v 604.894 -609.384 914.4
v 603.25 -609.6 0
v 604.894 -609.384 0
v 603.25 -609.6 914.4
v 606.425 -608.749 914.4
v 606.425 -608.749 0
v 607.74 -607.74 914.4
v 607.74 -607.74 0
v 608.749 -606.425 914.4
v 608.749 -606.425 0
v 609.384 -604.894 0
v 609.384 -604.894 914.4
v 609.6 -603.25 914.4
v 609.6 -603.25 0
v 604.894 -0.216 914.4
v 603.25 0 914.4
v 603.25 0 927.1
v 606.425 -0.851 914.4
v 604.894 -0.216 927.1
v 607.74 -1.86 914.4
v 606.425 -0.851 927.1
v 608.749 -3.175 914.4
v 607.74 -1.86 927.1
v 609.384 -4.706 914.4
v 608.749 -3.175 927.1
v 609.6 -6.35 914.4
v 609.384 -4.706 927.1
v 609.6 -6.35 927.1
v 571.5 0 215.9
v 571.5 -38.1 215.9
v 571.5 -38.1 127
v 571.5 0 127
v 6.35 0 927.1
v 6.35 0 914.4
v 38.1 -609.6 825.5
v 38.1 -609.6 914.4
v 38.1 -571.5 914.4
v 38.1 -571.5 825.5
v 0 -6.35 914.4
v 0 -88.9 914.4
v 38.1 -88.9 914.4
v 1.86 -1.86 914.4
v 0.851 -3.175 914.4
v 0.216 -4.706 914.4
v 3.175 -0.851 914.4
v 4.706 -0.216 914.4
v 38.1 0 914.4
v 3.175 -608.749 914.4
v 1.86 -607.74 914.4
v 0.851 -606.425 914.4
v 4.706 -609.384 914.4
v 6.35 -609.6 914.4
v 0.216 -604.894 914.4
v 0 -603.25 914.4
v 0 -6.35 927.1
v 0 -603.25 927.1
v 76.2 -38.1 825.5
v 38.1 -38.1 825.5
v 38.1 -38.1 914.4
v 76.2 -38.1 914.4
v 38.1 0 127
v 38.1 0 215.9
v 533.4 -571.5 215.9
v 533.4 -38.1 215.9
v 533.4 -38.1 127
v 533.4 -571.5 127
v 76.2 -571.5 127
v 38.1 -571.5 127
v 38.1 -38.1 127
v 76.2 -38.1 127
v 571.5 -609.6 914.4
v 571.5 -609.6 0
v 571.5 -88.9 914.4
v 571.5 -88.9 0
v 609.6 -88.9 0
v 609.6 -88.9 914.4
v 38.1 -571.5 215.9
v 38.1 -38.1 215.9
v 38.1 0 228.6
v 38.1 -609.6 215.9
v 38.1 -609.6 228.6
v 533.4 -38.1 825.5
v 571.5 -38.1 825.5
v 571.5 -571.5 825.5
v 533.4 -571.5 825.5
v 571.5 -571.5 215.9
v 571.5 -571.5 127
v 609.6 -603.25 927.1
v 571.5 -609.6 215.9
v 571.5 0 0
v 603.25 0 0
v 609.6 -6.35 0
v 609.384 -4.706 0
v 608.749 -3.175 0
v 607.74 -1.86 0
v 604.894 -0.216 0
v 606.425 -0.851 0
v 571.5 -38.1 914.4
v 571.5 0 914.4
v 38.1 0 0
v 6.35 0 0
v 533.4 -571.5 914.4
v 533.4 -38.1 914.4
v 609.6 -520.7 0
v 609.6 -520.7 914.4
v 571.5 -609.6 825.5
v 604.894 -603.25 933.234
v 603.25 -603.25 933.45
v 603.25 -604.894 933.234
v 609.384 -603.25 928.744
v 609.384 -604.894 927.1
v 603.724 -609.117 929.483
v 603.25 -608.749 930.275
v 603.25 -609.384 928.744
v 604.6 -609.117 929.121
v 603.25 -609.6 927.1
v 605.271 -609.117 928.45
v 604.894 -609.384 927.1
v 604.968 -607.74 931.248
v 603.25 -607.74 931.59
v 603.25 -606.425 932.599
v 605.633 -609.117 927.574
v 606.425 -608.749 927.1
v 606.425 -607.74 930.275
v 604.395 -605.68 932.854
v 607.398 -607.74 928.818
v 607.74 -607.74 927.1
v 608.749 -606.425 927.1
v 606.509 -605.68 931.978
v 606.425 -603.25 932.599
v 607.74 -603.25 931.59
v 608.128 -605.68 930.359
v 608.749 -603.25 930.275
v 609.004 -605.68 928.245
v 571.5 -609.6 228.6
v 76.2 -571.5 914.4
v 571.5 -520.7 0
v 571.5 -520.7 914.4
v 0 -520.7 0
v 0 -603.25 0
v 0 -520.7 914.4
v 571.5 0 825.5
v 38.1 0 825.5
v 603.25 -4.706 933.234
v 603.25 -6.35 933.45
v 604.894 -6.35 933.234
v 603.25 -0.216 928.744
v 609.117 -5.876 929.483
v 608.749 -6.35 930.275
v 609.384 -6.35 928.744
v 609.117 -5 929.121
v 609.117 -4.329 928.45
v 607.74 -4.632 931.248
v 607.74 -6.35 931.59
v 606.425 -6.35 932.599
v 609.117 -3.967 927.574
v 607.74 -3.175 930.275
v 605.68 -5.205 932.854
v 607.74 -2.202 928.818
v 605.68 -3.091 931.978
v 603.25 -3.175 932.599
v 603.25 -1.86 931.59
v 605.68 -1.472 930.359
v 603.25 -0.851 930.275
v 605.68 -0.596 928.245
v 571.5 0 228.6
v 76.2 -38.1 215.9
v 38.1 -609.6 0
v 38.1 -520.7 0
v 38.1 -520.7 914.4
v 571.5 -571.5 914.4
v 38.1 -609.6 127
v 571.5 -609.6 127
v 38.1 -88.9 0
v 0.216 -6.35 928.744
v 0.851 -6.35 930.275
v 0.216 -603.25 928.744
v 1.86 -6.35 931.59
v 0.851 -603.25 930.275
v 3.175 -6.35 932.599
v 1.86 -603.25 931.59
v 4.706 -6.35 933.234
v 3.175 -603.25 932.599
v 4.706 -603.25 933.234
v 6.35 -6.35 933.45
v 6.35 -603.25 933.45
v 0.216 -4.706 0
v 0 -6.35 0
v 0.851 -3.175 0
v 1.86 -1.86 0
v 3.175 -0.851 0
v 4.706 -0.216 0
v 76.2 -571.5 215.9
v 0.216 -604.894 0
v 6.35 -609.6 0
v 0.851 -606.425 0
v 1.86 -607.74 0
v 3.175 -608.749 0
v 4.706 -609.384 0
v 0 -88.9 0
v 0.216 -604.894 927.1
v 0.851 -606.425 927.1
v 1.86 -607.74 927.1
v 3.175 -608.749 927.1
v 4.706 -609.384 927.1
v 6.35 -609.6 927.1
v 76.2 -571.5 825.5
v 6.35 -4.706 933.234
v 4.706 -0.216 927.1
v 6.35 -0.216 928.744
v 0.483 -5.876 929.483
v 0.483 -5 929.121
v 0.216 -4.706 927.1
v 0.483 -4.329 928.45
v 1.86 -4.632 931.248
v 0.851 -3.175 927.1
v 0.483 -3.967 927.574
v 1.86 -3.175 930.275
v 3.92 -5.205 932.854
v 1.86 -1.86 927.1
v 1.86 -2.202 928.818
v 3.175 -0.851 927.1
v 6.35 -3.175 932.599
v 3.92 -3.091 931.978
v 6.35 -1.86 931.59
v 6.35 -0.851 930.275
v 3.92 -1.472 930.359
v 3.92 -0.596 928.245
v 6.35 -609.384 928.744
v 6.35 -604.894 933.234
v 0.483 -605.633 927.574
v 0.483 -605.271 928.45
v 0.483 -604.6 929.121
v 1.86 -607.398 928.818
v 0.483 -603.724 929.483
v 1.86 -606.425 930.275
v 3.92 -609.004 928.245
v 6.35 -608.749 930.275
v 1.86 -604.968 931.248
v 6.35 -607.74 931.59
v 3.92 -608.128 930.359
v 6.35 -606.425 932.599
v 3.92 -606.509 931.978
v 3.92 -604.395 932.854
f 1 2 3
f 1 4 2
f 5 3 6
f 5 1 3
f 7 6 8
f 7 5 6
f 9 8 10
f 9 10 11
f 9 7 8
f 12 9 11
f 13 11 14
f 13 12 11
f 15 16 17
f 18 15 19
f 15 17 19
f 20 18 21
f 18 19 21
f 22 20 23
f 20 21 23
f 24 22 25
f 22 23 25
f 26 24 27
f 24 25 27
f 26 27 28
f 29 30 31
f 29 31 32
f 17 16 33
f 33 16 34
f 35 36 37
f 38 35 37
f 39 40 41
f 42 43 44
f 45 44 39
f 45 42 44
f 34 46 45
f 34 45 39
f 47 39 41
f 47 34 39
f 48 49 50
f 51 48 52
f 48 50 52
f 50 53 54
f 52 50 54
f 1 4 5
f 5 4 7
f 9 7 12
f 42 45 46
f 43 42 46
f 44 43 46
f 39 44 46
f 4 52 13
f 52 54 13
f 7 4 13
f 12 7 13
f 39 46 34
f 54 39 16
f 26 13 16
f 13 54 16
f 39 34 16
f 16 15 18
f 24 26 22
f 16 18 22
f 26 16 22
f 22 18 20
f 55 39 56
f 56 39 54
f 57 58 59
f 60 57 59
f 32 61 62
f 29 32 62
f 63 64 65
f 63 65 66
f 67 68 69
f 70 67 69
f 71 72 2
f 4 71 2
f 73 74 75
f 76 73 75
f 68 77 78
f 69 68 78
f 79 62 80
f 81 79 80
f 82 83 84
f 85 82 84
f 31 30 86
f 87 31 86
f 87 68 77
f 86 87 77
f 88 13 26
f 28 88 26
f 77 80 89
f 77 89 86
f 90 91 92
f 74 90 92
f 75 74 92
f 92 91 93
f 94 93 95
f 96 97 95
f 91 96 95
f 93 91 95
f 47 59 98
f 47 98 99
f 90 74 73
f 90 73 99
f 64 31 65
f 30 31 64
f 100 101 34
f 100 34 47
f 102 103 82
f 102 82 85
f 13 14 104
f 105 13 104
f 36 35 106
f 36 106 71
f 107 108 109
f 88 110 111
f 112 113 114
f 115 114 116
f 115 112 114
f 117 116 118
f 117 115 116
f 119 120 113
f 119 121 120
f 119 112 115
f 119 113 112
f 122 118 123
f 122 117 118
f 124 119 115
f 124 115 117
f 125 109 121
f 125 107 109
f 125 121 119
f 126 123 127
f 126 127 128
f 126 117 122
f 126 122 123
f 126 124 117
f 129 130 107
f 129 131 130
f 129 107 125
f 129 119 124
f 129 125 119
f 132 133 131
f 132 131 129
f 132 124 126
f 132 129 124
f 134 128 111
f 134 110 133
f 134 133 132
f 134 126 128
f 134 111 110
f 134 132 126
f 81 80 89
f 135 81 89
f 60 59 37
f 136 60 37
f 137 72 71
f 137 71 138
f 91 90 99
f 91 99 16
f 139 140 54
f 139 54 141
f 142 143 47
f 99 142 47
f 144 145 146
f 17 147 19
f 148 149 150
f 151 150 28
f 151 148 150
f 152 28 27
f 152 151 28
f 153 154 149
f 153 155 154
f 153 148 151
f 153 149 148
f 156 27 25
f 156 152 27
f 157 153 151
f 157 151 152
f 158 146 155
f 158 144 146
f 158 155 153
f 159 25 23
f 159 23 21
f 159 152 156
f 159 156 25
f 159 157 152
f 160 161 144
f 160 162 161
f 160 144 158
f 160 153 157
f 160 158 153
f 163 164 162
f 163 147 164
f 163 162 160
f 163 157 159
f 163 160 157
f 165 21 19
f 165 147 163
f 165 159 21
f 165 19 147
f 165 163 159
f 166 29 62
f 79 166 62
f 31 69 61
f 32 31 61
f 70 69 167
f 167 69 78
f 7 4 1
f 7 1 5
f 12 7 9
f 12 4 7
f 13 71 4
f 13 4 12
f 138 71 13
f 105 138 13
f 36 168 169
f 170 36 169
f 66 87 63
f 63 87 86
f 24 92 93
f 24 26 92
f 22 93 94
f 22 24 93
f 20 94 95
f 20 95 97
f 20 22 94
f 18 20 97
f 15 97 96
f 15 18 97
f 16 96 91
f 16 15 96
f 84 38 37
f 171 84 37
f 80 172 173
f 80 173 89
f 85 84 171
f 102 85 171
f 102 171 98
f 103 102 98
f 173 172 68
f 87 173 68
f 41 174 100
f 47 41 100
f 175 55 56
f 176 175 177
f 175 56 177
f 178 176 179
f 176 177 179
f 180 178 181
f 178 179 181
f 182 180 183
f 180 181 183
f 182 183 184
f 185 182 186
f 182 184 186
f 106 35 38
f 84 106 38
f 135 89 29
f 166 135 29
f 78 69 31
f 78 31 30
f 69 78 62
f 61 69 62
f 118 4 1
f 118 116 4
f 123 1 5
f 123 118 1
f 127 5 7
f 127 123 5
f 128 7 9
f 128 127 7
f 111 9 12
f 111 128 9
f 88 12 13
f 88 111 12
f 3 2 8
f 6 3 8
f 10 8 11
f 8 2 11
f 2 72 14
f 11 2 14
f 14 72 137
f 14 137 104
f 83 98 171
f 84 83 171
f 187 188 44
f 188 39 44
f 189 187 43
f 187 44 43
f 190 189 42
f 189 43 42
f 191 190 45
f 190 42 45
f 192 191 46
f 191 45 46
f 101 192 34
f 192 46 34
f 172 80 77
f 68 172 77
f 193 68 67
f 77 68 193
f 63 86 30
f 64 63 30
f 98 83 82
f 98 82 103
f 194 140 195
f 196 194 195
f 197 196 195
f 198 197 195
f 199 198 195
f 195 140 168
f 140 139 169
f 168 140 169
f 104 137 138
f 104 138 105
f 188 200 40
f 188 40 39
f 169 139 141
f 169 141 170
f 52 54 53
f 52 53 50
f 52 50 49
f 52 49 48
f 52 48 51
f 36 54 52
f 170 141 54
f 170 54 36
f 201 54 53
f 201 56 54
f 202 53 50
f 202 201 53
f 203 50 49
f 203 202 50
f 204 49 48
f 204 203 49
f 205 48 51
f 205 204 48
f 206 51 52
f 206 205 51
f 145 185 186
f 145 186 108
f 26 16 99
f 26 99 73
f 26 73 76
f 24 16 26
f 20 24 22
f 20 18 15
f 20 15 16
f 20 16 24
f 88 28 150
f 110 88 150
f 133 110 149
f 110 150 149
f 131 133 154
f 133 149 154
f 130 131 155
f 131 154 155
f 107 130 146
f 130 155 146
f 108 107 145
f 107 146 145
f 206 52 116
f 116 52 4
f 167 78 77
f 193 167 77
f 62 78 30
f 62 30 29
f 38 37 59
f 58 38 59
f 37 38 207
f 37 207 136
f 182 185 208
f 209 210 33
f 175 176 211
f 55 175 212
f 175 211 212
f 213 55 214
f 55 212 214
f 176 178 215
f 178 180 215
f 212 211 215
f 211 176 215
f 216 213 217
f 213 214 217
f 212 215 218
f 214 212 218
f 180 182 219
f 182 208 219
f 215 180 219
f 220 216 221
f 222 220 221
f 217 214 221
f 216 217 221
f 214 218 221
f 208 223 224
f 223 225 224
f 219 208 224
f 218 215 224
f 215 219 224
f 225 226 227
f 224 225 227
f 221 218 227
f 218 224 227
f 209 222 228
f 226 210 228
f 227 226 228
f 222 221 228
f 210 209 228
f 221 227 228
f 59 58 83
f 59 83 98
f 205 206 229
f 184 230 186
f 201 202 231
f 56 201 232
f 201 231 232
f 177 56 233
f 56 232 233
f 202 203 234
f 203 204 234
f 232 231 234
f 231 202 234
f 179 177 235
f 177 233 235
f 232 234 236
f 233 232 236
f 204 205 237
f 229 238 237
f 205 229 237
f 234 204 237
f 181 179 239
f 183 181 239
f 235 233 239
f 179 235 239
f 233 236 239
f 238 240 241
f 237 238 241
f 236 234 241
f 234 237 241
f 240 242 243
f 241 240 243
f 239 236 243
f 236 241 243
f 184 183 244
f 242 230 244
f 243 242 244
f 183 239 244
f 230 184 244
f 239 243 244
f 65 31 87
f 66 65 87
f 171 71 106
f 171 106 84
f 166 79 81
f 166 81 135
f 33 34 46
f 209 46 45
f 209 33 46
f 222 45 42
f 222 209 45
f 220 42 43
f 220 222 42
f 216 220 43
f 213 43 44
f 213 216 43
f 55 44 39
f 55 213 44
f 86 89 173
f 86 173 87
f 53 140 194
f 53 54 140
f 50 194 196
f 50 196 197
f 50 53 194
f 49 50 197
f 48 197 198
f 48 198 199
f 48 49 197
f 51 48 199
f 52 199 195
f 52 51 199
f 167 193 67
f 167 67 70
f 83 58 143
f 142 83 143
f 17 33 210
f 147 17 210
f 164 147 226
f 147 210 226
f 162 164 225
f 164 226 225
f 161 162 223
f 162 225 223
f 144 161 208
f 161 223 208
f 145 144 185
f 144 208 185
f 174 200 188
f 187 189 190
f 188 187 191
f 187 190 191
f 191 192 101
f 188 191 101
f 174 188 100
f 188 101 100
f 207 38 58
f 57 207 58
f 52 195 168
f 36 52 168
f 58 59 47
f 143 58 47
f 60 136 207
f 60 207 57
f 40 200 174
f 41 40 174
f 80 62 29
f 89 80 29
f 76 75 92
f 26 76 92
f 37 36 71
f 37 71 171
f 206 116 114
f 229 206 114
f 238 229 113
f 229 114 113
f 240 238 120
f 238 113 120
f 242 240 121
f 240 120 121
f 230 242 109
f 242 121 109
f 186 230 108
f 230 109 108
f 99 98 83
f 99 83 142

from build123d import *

# Parameters (mm, degrees)
F0_W      = 38.1
F0_H      = 88.9
F1_DEPTH  = 914.4
F2_W      = 38.1
F2_H      = 88.9
F3_DEPTH  = 533.4
F2_W_2    = 482.6
F2_W_3    = 50.8
F4_DEPTH  = 38.1
F5_W      = 482.6
F5_H      = 88.9
F5_W_2    = 50.8
F6_DEPTH  = 38.1
F7_W      = 38.1
F7_H      = 88.9
F8_DEPTH  = 19.05
F9_W      = 38.1
F9_H      = 533.4
F10_DEPTH = 12.7
F11_R     = 6.35
F12_R     = 6.35


with BuildPart() as f1:
    # F0 (on Top) → F1 (new body)
    with BuildSketch(Plane.XY):
        with Locations((590.55, -44.45)):
            Rectangle(F0_W, F0_H)
        with Locations((19.05, -44.45)):
            Rectangle(F0_W, F0_H)
        with Locations((590.55, -565.15)):
            Rectangle(F0_W, F0_H)
        with Locations((19.05, -565.15)):
            Rectangle(F0_W, F0_H)
    extrude(amount=F1_DEPTH)

    # F12
    f12_edges = [f1.edges().sort_by_distance(p)[0] for p in [
        (0, -609.6, 457.2),
        (609.6, -609.6, 457.2),
        (609.6, 0, 457.2),
        (0, 0, 457.2),
    ]]
    fillet(f12_edges, radius=F12_R)


with BuildPart() as f3:
    # F2 (on face) → F3 (new body, through all)
    with BuildSketch(Plane.YZ.offset(38.1)):
        with Locations((-590.55, 869.95)):
            Rectangle(F2_W, F2_H)
        with Locations((-19.05, 171.45)):
            Rectangle(F2_W, F2_H)
        with Locations((-19.05, 869.95)):
            Rectangle(F2_W, F2_H)
        with Locations((-590.55, 171.45)):
            Rectangle(F2_W, F2_H)
    extrude(amount=F3_DEPTH)


with BuildPart() as f4:
    # F2 (on face) → F4 (new body)
    with BuildSketch(Plane.YZ.offset(38.1)):
        with Locations((-279.4, 869.95)):
            Rectangle(F2_W_2, F2_H)
        with Locations((-279.4, 171.45)):
            Rectangle(F2_W_2, F2_H)
        with Locations((-546.1, 171.45)):
            Rectangle(F2_W_3, F2_H)
        with Locations((-546.1, 869.95)):
            Rectangle(F2_W_3, F2_H)
    extrude(amount=F4_DEPTH)


with BuildPart() as f6:
    # F5 (on face) → F6 (new body)
    with BuildSketch(Plane(origin=(571.5, 0, 0), x_dir=(0, -1, 0), z_dir=(-1, 0, 0))):
        with Locations((330.2, 171.45)):
            Rectangle(F5_W, F5_H)
        with Locations((330.2, 869.95)):
            Rectangle(F5_W, F5_H)
        with Locations((63.5, 869.95)):
            Rectangle(F5_W_2, F5_H)
        with Locations((63.5, 171.45)):
            Rectangle(F5_W_2, F5_H)
    extrude(amount=F6_DEPTH)


with BuildPart() as f8:
    # F7 (on face) → F8 (new body)
    with BuildSketch(Plane.XY.offset(914.4)):
        with Locations((590.55, -44.45)):
            Rectangle(F7_W, F7_H)
        Polygon((571.5, -88.9), (571.5, 0), (0, 0), (0, -609.6), (609.6, -609.6), (609.6, -88.9), align=None)
    extrude(amount=F8_DEPTH)

    # F11
    f11_edges = [f8.edges().sort_by_distance(p)[0] for p in [
        (304.8, 0, 933.45),
        (609.6, -304.8, 933.45),
        (304.8, -609.6, 933.45),
        (609.6, 0, 923.925),
        (609.6, -609.6, 923.925),
        (0, -609.6, 923.925),
        (0, -304.8, 933.45),
        (0, 0, 923.925),
    ]]
    fillet(f11_edges, radius=F11_R)


with BuildPart() as f10:
    # F9 (on face) → F10 (new body)
    with BuildSketch(Plane.XY.offset(215.9)):
        Polygon((571.5, -38.1), (571.5, 0), (38.1, 0), (38.1, -609.6), (571.5, -609.6), (571.5, -571.5), (533.4, -571.5), (533.4, -38.1), align=None)
        with Locations((552.45, -304.8)):
            Rectangle(F9_W, F9_H)
    extrude(amount=F10_DEPTH)


solid = Compound([f1.part, f3.part, f4.part, f6.part, f8.part, f10.part])
